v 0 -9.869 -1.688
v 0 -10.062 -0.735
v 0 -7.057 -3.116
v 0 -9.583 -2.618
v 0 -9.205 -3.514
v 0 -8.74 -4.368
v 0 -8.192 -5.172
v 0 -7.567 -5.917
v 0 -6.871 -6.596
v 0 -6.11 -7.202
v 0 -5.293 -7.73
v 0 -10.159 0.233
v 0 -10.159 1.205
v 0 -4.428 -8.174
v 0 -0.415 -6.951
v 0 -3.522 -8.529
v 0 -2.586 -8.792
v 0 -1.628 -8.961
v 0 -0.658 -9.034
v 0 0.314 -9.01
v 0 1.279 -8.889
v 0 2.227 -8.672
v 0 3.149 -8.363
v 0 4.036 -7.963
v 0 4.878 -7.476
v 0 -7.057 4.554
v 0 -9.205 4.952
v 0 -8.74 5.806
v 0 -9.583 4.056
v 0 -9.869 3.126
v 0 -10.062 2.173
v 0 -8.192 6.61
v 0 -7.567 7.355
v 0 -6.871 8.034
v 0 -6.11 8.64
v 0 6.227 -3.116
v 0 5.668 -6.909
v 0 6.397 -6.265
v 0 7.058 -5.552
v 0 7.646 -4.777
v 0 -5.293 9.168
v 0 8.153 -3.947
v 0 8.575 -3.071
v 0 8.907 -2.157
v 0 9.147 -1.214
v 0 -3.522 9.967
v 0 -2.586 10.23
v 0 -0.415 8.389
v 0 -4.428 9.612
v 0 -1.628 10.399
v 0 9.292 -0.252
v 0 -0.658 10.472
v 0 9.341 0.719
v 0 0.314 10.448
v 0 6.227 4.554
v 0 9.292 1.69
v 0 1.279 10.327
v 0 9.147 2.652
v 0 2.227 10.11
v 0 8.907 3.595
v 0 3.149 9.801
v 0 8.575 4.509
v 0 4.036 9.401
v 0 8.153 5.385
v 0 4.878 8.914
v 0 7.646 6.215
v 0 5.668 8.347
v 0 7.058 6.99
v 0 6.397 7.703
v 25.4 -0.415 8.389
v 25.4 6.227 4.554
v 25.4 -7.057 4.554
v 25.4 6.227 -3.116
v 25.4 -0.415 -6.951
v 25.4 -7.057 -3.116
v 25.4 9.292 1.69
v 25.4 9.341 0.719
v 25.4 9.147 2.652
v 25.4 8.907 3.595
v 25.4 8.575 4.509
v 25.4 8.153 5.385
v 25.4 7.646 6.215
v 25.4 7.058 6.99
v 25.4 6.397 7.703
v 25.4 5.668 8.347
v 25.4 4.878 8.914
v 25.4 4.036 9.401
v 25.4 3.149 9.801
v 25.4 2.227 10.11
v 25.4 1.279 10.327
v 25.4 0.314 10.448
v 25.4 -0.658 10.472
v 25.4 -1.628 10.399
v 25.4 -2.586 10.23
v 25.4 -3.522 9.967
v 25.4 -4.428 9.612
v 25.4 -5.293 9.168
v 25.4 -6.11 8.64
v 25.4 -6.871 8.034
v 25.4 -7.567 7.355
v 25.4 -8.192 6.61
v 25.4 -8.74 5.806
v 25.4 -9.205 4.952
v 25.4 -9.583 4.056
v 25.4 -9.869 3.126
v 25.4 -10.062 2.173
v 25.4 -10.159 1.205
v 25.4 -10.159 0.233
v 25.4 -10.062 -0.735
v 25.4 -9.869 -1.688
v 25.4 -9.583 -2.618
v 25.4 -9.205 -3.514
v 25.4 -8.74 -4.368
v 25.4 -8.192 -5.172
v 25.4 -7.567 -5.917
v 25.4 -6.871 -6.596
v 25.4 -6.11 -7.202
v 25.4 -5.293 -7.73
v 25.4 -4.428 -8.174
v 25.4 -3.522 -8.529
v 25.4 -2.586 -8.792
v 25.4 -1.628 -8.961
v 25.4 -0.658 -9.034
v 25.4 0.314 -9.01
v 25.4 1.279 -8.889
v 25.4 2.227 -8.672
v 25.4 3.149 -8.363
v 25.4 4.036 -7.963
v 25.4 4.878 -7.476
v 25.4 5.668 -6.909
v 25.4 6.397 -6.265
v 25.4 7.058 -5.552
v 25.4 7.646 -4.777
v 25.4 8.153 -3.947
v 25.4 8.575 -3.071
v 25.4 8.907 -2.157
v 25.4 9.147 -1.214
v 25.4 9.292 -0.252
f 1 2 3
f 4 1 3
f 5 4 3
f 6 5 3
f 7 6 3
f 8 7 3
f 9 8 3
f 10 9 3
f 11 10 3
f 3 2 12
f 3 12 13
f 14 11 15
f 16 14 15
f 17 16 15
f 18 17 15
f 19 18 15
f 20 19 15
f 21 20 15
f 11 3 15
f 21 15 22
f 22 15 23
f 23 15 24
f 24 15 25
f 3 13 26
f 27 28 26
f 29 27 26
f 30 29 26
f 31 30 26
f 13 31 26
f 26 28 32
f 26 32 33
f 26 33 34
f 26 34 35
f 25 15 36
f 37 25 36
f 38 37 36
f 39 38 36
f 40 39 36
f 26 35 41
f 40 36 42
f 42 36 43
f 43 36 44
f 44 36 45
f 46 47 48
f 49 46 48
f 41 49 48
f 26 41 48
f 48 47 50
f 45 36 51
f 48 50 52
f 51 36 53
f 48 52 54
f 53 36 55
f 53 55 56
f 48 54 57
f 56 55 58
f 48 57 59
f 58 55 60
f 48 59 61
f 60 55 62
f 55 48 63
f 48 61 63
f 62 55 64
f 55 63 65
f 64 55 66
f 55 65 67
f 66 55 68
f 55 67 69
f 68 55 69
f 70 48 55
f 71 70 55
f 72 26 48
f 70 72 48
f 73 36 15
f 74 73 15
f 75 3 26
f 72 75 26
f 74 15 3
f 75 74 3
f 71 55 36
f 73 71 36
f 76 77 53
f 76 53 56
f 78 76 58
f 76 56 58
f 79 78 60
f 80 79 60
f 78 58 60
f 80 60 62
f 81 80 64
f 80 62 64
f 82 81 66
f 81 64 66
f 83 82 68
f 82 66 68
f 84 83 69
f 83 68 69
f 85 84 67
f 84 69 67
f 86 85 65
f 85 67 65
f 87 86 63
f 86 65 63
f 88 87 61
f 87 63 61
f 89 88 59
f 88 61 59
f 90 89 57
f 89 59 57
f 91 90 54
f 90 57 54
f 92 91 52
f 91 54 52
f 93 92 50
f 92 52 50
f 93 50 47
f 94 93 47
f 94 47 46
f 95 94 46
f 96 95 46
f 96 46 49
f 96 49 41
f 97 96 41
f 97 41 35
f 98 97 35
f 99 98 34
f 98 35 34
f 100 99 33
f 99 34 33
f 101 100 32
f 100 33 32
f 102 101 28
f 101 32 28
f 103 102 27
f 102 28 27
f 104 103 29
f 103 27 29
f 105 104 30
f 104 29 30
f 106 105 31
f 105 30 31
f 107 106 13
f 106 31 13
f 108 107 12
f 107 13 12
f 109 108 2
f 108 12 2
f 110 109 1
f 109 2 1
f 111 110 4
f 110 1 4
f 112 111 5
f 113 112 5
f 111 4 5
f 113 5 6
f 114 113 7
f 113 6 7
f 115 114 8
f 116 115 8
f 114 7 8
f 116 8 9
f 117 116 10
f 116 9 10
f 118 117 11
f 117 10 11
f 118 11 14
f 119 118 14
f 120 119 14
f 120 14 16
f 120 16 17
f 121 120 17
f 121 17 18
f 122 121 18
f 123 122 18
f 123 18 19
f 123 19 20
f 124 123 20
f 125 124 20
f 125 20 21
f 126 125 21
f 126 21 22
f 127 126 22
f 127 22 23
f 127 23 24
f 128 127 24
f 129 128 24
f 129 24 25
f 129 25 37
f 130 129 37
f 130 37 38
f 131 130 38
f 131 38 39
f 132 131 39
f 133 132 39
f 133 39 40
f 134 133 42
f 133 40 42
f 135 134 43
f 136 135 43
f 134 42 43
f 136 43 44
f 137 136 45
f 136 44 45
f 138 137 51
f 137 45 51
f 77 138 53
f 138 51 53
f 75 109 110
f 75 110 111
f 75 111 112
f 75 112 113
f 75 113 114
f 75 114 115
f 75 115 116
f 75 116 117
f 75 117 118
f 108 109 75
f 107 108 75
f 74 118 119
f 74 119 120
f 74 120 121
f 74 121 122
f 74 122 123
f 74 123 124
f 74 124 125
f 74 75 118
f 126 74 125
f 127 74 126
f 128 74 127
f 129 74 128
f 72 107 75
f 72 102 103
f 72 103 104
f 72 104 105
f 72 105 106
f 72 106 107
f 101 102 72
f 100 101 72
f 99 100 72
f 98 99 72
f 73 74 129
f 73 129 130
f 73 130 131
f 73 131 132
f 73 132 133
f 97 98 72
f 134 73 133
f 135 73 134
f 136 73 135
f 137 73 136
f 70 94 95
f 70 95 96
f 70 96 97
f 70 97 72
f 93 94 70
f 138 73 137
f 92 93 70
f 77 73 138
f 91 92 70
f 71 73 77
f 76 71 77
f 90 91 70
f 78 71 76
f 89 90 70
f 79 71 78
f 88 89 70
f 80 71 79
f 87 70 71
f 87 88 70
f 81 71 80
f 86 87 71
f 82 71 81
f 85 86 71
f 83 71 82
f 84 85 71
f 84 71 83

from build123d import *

# Parameters (mm, degrees)
F0_R     = 9.756
F1_DEPTH = 25.4


with BuildPart() as f1:
    # F0 (on Right) → F1 (new body)
    with BuildSketch(Plane.YZ):
        with Locations((-0.415131, 0.719028)):
            Circle(F0_R)
        Polygon((6.226969, 4.553847), (6.226969, -3.11579), (-0.415131, -6.950608), (-7.057231, -3.11579), (-7.057231, 4.553847), (-0.415131, 8.388665), align=None, mode=Mode.SUBTRACT)
    extrude(amount=F1_DEPTH)


solid = f1.part
